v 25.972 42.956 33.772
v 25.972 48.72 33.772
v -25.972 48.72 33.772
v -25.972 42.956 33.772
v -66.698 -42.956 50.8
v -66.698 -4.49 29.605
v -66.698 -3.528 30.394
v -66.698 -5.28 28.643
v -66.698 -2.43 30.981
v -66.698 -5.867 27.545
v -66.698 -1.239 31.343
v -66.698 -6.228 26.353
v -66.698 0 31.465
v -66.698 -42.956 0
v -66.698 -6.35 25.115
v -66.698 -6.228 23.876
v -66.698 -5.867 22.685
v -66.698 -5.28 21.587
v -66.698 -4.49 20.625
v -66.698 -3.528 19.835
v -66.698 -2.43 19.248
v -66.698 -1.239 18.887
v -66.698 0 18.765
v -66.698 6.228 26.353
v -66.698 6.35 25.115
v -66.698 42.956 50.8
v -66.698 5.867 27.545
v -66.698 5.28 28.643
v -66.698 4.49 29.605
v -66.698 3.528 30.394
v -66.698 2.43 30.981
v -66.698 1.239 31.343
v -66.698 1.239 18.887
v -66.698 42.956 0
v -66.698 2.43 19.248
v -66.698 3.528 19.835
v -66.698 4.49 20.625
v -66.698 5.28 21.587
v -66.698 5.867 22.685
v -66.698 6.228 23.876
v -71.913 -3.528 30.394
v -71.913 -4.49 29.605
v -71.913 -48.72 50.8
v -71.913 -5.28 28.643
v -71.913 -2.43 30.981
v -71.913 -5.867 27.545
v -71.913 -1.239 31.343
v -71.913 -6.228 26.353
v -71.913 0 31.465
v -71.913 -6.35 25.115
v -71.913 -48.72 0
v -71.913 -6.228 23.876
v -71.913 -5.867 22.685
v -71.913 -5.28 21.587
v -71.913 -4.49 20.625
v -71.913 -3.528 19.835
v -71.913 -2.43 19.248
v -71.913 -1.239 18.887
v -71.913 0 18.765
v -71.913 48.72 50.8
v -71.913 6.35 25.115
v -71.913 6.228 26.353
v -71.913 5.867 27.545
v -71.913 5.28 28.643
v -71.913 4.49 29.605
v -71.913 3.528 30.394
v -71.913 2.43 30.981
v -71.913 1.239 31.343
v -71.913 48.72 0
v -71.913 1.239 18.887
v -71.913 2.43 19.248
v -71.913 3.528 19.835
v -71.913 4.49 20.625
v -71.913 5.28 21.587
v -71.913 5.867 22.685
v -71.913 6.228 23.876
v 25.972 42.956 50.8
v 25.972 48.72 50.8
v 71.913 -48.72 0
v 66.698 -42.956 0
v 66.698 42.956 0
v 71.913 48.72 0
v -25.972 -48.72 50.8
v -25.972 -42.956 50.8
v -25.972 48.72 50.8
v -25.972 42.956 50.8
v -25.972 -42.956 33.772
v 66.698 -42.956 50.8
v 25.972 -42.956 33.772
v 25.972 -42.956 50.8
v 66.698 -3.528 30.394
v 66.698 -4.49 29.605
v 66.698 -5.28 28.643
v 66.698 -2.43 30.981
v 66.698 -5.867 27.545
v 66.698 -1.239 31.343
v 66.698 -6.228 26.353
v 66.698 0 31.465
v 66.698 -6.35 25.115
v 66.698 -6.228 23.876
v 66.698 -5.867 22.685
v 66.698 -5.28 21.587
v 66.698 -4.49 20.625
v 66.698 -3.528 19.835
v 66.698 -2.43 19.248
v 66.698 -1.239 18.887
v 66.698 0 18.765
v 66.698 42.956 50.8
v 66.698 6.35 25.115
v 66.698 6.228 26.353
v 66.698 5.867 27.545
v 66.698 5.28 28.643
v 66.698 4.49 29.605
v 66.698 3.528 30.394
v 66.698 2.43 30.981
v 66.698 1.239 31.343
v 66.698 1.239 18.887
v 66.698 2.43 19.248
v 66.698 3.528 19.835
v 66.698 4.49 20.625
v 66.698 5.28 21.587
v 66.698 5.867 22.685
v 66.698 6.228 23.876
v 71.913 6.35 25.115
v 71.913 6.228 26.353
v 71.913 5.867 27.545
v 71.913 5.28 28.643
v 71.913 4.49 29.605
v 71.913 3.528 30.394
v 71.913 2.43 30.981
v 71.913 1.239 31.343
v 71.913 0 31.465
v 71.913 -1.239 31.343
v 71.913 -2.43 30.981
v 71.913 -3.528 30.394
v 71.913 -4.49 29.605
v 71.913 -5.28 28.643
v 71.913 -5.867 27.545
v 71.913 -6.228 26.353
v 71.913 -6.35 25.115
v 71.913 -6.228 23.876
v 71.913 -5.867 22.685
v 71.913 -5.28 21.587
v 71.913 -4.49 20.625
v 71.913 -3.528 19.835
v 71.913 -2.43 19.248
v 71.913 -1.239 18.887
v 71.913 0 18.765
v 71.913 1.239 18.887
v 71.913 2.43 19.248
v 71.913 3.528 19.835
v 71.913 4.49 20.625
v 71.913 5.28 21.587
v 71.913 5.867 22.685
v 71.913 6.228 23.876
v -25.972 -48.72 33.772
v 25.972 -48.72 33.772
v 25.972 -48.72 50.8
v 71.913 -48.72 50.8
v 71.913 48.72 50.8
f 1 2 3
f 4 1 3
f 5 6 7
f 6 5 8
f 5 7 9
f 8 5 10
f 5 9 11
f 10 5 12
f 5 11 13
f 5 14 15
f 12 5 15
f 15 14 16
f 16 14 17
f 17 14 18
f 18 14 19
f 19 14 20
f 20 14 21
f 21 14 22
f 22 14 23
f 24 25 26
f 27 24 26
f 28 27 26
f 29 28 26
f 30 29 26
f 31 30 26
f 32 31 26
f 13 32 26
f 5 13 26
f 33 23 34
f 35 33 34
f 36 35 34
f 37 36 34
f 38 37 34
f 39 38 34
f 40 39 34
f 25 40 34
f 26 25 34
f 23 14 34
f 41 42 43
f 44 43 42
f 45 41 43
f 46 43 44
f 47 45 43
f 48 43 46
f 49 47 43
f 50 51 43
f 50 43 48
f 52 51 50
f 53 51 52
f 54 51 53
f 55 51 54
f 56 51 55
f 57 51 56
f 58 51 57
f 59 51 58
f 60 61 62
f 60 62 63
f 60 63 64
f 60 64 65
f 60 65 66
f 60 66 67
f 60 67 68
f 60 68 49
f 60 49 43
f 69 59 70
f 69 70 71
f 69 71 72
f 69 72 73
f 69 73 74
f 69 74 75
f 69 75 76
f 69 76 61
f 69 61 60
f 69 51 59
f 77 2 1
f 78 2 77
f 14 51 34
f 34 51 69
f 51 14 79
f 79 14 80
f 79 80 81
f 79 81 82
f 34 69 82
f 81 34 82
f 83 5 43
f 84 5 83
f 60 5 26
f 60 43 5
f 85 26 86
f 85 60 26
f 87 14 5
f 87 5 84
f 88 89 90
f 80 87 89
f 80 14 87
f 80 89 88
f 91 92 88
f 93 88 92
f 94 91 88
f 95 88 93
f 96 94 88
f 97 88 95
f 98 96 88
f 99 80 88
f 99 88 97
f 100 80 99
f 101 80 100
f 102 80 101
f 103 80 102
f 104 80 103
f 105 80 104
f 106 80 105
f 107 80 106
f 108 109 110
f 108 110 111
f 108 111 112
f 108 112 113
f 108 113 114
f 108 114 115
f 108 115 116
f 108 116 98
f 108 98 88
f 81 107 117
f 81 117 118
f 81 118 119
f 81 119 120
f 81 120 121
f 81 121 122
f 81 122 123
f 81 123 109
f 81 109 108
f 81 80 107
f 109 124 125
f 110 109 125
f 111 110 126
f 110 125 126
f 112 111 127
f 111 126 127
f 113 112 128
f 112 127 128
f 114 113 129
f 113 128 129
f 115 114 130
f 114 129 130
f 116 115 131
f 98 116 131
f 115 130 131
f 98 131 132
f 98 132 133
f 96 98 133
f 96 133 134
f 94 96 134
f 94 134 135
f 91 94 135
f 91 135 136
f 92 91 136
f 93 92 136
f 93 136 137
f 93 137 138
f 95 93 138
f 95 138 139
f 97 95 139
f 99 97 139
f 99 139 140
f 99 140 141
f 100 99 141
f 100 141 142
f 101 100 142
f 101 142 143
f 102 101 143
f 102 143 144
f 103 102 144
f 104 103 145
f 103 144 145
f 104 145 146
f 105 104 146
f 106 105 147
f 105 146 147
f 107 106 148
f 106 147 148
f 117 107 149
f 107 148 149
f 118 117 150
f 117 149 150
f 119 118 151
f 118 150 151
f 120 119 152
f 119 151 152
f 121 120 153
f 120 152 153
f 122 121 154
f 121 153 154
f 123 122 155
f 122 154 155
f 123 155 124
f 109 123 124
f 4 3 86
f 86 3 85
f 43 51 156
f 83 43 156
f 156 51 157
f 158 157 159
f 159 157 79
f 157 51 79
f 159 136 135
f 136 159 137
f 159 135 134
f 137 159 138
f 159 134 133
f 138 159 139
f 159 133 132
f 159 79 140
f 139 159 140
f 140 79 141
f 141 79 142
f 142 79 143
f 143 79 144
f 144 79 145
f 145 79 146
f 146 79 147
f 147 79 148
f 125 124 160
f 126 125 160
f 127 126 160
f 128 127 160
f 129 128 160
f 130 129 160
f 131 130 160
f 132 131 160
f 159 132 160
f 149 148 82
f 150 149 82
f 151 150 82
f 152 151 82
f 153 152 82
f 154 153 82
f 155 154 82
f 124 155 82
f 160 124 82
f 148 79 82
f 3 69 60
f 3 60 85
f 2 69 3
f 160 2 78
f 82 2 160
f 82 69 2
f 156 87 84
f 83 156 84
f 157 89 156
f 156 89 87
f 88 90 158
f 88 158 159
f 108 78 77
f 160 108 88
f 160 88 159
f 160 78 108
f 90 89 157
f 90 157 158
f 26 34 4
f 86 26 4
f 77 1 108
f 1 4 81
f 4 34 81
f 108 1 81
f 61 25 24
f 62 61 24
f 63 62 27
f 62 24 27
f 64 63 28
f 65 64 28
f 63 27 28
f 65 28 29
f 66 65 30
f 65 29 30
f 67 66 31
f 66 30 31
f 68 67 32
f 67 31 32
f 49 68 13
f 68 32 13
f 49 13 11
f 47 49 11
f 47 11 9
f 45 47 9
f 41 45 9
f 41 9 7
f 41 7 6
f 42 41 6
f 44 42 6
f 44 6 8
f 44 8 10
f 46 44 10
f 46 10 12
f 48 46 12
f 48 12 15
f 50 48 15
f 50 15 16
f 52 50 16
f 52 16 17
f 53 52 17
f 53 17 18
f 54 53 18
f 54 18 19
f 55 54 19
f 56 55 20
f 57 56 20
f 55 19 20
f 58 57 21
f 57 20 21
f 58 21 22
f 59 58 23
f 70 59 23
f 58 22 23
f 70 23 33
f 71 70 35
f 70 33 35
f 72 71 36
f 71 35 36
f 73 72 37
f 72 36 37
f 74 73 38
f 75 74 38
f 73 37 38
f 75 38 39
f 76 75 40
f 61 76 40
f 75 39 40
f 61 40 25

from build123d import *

# Parameters (mm, degrees)
F0_W     = 143.8258737326
F0_H     = 97.4392816424
F0_W_2   = 133.3957463503
F0_H_2   = 85.9112516046
F1_DEPTH = 50.8
F2_W     = 51.9433170557
F2_H     = 17.0282212257
F3_DEPTH = 97.4402816424
F5_D     = 12.7


with BuildPart() as f1:
    # F0 (on Top) → F1 (new body)
    with BuildSketch(Plane.XY):
        Rectangle(F0_W, F0_H)
        Rectangle(F0_W_2, F0_H_2, mode=Mode.SUBTRACT)
    extrude(amount=F1_DEPTH)

    # F2 (on face) → F3 (cut, through all)
    with BuildSketch(Plane(origin=(0, 48.7196408212, 0), x_dir=(-1, 0, 0), z_dir=(0, 1, 0))):
        with Locations((0, 42.2858893871)):
            Rectangle(F2_W, F2_H)
    extrude(amount=-F3_DEPTH, mode=Mode.SUBTRACT)

    # F5 (through all)
    with Locations(Plane(origin=(-71.9129368663, 0, 0), x_dir=(0, -1, 0), z_dir=(-1, 0, 0))):
        with Locations((0, 25.1146312803)):
            Hole(F5_D / 2)


solid = f1.part
